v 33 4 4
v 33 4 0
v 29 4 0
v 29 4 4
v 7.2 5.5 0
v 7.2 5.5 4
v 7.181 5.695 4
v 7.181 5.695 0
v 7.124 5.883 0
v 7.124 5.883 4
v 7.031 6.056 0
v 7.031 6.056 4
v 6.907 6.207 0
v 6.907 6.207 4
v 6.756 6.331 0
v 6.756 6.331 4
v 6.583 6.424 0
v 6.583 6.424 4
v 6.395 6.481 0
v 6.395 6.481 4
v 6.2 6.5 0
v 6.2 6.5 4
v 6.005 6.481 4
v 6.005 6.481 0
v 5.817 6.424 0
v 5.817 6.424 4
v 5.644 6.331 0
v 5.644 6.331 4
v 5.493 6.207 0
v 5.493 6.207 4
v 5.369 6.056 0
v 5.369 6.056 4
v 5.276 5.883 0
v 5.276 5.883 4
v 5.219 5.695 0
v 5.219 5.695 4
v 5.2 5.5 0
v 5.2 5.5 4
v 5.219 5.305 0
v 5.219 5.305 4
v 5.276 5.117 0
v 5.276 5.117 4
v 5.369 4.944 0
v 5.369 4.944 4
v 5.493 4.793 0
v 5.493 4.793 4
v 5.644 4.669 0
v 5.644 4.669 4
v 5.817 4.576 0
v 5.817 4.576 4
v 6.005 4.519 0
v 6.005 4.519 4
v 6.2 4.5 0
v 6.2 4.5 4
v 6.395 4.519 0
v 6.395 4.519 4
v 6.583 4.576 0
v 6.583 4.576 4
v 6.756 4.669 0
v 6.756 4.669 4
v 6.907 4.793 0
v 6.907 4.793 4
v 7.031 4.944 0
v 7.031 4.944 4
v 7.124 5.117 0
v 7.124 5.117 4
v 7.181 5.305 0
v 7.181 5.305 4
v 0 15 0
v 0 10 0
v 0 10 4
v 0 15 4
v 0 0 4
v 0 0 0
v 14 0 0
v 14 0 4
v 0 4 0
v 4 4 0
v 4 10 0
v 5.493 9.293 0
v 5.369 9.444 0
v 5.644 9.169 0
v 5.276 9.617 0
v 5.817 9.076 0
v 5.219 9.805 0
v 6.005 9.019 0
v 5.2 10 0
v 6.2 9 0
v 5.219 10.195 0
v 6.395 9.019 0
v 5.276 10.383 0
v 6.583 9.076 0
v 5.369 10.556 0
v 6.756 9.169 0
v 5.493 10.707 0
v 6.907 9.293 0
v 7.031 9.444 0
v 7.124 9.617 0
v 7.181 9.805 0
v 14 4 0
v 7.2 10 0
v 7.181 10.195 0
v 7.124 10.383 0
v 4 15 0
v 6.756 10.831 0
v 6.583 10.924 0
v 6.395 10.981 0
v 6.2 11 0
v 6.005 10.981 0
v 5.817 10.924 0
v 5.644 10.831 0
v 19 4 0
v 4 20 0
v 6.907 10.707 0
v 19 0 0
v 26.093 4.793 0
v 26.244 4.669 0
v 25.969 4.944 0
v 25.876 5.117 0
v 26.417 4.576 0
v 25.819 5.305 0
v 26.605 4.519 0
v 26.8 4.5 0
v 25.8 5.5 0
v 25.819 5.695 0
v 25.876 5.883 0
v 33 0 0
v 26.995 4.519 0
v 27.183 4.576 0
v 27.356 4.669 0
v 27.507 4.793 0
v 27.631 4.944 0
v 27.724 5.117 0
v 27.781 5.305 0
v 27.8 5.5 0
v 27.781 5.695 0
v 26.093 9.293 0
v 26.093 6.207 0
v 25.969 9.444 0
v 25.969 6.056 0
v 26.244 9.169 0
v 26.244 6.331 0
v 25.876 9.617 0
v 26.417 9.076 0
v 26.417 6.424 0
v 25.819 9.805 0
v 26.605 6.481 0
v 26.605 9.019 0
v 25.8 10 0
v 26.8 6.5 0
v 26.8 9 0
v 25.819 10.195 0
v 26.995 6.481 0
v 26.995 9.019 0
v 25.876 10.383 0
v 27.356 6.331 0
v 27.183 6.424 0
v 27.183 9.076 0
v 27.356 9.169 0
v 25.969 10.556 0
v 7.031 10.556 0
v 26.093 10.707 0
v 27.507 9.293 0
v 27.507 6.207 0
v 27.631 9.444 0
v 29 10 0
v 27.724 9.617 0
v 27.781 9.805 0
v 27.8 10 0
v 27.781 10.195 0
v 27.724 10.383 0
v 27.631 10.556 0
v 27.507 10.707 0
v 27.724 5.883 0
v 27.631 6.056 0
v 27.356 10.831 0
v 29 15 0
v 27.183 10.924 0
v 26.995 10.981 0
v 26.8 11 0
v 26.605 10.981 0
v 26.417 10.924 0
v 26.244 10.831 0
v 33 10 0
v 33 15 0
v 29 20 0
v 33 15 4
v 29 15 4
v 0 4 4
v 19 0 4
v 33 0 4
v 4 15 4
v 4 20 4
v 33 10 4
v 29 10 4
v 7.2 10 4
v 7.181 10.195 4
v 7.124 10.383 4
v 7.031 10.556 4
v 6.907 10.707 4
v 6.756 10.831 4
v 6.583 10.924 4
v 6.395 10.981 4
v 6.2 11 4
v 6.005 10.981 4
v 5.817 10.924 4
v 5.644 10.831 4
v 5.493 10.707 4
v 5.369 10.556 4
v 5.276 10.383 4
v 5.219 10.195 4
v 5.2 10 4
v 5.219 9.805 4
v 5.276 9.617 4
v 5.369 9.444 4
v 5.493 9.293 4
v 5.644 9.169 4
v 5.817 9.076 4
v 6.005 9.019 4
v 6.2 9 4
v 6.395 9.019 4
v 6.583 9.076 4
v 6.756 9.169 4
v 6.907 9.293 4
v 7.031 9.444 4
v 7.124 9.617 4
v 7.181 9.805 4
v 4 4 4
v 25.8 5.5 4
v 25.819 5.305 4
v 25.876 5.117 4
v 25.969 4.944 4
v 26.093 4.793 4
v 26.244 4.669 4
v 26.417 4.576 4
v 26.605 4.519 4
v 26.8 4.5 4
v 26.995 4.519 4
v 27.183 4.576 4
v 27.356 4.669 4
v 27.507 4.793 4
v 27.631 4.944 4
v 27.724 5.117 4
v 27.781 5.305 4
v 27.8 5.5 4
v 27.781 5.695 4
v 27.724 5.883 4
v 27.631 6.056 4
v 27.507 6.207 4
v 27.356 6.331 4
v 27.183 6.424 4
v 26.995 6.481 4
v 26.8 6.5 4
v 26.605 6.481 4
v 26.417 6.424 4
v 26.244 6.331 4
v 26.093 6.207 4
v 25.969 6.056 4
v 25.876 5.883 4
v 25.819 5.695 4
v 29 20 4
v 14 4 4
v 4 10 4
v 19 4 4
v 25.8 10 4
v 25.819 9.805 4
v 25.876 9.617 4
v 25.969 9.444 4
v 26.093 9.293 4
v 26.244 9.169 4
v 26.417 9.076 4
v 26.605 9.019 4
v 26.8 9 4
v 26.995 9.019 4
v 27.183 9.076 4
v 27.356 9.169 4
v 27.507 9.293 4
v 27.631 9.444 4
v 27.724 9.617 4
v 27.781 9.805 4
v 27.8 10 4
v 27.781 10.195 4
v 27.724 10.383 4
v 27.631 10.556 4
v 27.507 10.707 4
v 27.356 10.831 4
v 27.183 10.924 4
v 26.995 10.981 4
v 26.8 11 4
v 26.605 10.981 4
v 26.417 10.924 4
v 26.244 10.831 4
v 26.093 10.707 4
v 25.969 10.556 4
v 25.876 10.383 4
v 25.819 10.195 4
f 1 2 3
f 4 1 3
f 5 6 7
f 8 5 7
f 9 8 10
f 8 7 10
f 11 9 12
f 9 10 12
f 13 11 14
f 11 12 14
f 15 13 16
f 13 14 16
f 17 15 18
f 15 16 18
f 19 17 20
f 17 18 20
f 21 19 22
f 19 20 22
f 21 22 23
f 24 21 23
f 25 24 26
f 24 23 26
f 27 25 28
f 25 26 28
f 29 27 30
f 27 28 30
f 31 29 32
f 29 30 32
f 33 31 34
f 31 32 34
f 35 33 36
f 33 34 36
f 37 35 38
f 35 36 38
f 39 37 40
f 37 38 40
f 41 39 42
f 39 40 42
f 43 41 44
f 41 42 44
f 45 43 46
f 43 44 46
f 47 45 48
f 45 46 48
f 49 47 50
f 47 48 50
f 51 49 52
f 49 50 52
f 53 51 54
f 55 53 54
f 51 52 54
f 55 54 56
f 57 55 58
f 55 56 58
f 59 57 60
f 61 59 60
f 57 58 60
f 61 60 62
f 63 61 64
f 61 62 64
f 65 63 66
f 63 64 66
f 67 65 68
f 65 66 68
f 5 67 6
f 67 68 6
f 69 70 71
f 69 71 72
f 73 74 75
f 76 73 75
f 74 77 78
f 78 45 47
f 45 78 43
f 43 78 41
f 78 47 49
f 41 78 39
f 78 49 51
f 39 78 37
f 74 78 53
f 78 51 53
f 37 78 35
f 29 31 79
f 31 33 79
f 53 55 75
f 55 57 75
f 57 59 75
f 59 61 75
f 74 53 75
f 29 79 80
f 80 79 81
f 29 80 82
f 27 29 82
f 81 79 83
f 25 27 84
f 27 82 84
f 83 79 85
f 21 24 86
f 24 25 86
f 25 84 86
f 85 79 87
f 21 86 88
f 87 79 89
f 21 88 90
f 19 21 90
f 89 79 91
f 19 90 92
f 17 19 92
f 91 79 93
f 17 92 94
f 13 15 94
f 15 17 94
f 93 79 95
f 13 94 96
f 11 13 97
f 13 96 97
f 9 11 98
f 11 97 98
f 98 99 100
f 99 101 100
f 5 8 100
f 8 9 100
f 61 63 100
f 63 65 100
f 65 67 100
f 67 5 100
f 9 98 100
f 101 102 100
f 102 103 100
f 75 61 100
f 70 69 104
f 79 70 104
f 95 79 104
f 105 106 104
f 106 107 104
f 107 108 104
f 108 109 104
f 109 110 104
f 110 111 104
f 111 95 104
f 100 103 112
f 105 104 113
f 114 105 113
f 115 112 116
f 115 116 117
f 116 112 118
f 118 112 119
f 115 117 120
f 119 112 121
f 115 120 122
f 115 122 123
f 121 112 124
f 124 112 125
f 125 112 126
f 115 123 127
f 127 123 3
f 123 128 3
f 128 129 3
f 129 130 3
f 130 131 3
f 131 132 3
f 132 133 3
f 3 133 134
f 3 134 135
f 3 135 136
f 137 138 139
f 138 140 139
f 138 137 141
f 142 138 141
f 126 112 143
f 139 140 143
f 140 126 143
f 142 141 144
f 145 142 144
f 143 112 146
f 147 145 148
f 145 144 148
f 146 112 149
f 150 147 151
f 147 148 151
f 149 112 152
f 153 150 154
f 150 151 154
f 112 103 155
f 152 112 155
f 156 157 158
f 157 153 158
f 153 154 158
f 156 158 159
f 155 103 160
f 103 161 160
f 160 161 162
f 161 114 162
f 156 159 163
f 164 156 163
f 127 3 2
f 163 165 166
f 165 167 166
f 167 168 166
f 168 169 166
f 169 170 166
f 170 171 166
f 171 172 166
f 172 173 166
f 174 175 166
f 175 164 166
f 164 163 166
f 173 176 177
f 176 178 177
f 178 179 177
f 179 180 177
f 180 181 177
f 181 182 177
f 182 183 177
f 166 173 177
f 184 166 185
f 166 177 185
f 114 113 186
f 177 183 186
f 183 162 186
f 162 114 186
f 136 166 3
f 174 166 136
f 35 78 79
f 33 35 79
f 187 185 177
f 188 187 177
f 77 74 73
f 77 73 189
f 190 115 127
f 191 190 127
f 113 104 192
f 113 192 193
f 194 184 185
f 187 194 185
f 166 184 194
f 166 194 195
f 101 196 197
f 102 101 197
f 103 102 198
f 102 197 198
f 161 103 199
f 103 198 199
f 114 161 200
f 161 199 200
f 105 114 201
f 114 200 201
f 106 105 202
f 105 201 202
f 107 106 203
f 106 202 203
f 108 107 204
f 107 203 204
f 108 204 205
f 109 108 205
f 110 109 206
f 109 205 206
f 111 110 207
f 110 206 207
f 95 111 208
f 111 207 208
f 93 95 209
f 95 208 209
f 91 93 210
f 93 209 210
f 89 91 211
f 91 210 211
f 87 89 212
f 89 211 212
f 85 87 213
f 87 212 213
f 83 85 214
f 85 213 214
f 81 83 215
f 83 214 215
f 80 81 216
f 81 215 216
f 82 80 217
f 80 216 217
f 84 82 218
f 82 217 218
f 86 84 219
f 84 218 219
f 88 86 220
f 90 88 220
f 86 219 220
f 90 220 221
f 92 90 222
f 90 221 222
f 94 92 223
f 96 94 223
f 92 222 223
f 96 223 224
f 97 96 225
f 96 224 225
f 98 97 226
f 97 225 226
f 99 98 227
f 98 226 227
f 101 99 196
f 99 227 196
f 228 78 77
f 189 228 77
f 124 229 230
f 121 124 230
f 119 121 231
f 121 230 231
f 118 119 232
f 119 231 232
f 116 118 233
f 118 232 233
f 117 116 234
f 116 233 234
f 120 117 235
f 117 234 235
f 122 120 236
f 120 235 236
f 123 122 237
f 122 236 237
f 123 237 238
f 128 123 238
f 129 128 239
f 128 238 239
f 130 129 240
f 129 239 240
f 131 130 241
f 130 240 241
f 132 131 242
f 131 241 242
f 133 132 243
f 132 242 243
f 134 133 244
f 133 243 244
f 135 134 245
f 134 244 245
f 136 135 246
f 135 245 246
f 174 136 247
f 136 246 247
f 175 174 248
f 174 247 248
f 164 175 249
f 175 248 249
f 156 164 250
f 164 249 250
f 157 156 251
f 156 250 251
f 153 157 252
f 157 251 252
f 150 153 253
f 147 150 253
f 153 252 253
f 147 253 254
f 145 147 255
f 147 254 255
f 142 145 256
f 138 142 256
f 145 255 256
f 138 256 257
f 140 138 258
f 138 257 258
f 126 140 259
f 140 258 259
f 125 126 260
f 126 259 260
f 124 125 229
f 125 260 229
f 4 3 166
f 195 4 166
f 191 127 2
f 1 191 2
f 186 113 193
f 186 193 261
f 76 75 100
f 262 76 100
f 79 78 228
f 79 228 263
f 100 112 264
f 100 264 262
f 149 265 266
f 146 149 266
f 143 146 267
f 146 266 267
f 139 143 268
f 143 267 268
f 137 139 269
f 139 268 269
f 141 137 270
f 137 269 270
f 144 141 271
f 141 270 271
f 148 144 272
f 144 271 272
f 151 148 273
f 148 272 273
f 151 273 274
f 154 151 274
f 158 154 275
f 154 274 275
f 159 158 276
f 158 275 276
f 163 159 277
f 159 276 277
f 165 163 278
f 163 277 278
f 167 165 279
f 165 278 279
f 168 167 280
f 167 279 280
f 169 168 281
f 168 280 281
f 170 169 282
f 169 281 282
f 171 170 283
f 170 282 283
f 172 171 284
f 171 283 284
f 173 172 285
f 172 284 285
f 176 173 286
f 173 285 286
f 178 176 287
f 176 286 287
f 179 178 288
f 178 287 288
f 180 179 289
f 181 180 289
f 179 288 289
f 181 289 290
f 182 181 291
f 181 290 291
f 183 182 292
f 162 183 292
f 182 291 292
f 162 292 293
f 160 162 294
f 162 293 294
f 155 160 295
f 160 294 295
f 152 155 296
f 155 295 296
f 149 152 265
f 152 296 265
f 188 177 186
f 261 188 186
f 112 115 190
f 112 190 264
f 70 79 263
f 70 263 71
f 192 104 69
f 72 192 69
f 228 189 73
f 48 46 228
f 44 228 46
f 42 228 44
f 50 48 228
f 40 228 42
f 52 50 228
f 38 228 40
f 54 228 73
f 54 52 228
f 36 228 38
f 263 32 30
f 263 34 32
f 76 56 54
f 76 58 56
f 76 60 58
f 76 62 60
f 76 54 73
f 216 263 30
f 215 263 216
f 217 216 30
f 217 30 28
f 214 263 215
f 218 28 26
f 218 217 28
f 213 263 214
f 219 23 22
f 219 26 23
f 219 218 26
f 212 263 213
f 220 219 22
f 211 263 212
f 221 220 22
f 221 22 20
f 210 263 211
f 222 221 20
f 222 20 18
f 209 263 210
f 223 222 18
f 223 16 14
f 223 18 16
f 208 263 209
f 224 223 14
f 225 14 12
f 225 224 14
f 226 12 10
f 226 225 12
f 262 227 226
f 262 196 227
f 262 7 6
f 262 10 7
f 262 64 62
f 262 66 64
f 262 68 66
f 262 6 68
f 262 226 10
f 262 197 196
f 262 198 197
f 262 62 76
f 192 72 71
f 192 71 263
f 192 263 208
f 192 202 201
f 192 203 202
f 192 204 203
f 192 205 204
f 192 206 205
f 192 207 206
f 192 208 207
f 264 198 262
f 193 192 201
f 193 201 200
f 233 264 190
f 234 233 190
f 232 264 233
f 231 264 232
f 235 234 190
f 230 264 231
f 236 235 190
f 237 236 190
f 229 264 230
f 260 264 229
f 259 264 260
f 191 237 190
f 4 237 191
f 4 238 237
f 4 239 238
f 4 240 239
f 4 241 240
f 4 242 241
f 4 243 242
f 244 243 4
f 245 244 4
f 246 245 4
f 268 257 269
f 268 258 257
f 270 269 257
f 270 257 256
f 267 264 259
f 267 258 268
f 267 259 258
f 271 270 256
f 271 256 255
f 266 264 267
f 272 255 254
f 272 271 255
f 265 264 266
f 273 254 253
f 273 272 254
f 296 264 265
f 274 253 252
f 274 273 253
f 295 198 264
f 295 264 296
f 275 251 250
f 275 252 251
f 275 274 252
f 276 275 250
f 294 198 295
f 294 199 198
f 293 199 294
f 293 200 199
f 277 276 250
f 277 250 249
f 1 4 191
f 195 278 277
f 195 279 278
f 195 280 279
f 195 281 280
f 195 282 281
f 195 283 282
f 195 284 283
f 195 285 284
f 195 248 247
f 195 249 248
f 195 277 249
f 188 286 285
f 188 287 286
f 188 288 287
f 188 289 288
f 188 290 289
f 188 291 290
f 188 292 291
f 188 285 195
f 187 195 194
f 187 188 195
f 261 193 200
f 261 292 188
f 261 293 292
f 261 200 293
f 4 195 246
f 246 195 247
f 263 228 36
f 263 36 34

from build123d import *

# Parameters (mm, degrees)
SKETCH_1_W          = 33
SKETCH_1_H          = 20
EXTRUDE_1_DEPTH     = 4
SKETCH_2_W          = 4
SKETCH_2_H          = 5
SKETCH_2_H_2        = 6
SKETCH_2_W_2        = 5
SKETCH_2_H_3        = 4
CUT_EXTRUDE_1_DEPTH = 4
SKETCH_3_R          = 1
CUT_EXTRUDE_2_DEPTH = 4


with BuildPart() as part:
    # Эскиз1 → Бобышка-Вытянуть1 (new body)
    with BuildSketch(Plane.XY):
        with Locations((16.5, 10)):
            Rectangle(SKETCH_1_W, SKETCH_1_H)
    extrude(amount=EXTRUDE_1_DEPTH)

    # Эскиз2 → Вырез-Вытянуть1 (cut)
    with BuildSketch(Plane(origin=(0, 0, 0), x_dir=(-1, 0, 0), z_dir=(0, 0, -1))):
        with Locations((-2, 17.5)):
            Rectangle(SKETCH_2_W, SKETCH_2_H)
        with Locations((-2, 7)):
            Rectangle(SKETCH_2_W, SKETCH_2_H_2)
        with Locations((-16.5, 2)):
            Rectangle(SKETCH_2_W_2, SKETCH_2_H_3)
        with Locations((-31, 7)):
            Rectangle(SKETCH_2_W, SKETCH_2_H_2)
        with Locations((-31, 17.5)):
            Rectangle(SKETCH_2_W, SKETCH_2_H)
    extrude(amount=-CUT_EXTRUDE_1_DEPTH, mode=Mode.SUBTRACT)

    # Эскиз3 → Вырез-Вытянуть2 (cut)
    with BuildSketch(Plane.XY.offset(4)):
        with Locations((6.2, 10)):
            Circle(SKETCH_3_R)
        with Locations(Location((26.8, 10, 0), (0, 0, 180))):
            Circle(SKETCH_3_R)
        with Locations((6.2, 5.5)):
            Circle(SKETCH_3_R)
        with Locations(Location((26.8, 5.5, 0), (0, 0, 180))):
            Circle(SKETCH_3_R)
    extrude(amount=-CUT_EXTRUDE_2_DEPTH, mode=Mode.SUBTRACT)


solid = part.part
